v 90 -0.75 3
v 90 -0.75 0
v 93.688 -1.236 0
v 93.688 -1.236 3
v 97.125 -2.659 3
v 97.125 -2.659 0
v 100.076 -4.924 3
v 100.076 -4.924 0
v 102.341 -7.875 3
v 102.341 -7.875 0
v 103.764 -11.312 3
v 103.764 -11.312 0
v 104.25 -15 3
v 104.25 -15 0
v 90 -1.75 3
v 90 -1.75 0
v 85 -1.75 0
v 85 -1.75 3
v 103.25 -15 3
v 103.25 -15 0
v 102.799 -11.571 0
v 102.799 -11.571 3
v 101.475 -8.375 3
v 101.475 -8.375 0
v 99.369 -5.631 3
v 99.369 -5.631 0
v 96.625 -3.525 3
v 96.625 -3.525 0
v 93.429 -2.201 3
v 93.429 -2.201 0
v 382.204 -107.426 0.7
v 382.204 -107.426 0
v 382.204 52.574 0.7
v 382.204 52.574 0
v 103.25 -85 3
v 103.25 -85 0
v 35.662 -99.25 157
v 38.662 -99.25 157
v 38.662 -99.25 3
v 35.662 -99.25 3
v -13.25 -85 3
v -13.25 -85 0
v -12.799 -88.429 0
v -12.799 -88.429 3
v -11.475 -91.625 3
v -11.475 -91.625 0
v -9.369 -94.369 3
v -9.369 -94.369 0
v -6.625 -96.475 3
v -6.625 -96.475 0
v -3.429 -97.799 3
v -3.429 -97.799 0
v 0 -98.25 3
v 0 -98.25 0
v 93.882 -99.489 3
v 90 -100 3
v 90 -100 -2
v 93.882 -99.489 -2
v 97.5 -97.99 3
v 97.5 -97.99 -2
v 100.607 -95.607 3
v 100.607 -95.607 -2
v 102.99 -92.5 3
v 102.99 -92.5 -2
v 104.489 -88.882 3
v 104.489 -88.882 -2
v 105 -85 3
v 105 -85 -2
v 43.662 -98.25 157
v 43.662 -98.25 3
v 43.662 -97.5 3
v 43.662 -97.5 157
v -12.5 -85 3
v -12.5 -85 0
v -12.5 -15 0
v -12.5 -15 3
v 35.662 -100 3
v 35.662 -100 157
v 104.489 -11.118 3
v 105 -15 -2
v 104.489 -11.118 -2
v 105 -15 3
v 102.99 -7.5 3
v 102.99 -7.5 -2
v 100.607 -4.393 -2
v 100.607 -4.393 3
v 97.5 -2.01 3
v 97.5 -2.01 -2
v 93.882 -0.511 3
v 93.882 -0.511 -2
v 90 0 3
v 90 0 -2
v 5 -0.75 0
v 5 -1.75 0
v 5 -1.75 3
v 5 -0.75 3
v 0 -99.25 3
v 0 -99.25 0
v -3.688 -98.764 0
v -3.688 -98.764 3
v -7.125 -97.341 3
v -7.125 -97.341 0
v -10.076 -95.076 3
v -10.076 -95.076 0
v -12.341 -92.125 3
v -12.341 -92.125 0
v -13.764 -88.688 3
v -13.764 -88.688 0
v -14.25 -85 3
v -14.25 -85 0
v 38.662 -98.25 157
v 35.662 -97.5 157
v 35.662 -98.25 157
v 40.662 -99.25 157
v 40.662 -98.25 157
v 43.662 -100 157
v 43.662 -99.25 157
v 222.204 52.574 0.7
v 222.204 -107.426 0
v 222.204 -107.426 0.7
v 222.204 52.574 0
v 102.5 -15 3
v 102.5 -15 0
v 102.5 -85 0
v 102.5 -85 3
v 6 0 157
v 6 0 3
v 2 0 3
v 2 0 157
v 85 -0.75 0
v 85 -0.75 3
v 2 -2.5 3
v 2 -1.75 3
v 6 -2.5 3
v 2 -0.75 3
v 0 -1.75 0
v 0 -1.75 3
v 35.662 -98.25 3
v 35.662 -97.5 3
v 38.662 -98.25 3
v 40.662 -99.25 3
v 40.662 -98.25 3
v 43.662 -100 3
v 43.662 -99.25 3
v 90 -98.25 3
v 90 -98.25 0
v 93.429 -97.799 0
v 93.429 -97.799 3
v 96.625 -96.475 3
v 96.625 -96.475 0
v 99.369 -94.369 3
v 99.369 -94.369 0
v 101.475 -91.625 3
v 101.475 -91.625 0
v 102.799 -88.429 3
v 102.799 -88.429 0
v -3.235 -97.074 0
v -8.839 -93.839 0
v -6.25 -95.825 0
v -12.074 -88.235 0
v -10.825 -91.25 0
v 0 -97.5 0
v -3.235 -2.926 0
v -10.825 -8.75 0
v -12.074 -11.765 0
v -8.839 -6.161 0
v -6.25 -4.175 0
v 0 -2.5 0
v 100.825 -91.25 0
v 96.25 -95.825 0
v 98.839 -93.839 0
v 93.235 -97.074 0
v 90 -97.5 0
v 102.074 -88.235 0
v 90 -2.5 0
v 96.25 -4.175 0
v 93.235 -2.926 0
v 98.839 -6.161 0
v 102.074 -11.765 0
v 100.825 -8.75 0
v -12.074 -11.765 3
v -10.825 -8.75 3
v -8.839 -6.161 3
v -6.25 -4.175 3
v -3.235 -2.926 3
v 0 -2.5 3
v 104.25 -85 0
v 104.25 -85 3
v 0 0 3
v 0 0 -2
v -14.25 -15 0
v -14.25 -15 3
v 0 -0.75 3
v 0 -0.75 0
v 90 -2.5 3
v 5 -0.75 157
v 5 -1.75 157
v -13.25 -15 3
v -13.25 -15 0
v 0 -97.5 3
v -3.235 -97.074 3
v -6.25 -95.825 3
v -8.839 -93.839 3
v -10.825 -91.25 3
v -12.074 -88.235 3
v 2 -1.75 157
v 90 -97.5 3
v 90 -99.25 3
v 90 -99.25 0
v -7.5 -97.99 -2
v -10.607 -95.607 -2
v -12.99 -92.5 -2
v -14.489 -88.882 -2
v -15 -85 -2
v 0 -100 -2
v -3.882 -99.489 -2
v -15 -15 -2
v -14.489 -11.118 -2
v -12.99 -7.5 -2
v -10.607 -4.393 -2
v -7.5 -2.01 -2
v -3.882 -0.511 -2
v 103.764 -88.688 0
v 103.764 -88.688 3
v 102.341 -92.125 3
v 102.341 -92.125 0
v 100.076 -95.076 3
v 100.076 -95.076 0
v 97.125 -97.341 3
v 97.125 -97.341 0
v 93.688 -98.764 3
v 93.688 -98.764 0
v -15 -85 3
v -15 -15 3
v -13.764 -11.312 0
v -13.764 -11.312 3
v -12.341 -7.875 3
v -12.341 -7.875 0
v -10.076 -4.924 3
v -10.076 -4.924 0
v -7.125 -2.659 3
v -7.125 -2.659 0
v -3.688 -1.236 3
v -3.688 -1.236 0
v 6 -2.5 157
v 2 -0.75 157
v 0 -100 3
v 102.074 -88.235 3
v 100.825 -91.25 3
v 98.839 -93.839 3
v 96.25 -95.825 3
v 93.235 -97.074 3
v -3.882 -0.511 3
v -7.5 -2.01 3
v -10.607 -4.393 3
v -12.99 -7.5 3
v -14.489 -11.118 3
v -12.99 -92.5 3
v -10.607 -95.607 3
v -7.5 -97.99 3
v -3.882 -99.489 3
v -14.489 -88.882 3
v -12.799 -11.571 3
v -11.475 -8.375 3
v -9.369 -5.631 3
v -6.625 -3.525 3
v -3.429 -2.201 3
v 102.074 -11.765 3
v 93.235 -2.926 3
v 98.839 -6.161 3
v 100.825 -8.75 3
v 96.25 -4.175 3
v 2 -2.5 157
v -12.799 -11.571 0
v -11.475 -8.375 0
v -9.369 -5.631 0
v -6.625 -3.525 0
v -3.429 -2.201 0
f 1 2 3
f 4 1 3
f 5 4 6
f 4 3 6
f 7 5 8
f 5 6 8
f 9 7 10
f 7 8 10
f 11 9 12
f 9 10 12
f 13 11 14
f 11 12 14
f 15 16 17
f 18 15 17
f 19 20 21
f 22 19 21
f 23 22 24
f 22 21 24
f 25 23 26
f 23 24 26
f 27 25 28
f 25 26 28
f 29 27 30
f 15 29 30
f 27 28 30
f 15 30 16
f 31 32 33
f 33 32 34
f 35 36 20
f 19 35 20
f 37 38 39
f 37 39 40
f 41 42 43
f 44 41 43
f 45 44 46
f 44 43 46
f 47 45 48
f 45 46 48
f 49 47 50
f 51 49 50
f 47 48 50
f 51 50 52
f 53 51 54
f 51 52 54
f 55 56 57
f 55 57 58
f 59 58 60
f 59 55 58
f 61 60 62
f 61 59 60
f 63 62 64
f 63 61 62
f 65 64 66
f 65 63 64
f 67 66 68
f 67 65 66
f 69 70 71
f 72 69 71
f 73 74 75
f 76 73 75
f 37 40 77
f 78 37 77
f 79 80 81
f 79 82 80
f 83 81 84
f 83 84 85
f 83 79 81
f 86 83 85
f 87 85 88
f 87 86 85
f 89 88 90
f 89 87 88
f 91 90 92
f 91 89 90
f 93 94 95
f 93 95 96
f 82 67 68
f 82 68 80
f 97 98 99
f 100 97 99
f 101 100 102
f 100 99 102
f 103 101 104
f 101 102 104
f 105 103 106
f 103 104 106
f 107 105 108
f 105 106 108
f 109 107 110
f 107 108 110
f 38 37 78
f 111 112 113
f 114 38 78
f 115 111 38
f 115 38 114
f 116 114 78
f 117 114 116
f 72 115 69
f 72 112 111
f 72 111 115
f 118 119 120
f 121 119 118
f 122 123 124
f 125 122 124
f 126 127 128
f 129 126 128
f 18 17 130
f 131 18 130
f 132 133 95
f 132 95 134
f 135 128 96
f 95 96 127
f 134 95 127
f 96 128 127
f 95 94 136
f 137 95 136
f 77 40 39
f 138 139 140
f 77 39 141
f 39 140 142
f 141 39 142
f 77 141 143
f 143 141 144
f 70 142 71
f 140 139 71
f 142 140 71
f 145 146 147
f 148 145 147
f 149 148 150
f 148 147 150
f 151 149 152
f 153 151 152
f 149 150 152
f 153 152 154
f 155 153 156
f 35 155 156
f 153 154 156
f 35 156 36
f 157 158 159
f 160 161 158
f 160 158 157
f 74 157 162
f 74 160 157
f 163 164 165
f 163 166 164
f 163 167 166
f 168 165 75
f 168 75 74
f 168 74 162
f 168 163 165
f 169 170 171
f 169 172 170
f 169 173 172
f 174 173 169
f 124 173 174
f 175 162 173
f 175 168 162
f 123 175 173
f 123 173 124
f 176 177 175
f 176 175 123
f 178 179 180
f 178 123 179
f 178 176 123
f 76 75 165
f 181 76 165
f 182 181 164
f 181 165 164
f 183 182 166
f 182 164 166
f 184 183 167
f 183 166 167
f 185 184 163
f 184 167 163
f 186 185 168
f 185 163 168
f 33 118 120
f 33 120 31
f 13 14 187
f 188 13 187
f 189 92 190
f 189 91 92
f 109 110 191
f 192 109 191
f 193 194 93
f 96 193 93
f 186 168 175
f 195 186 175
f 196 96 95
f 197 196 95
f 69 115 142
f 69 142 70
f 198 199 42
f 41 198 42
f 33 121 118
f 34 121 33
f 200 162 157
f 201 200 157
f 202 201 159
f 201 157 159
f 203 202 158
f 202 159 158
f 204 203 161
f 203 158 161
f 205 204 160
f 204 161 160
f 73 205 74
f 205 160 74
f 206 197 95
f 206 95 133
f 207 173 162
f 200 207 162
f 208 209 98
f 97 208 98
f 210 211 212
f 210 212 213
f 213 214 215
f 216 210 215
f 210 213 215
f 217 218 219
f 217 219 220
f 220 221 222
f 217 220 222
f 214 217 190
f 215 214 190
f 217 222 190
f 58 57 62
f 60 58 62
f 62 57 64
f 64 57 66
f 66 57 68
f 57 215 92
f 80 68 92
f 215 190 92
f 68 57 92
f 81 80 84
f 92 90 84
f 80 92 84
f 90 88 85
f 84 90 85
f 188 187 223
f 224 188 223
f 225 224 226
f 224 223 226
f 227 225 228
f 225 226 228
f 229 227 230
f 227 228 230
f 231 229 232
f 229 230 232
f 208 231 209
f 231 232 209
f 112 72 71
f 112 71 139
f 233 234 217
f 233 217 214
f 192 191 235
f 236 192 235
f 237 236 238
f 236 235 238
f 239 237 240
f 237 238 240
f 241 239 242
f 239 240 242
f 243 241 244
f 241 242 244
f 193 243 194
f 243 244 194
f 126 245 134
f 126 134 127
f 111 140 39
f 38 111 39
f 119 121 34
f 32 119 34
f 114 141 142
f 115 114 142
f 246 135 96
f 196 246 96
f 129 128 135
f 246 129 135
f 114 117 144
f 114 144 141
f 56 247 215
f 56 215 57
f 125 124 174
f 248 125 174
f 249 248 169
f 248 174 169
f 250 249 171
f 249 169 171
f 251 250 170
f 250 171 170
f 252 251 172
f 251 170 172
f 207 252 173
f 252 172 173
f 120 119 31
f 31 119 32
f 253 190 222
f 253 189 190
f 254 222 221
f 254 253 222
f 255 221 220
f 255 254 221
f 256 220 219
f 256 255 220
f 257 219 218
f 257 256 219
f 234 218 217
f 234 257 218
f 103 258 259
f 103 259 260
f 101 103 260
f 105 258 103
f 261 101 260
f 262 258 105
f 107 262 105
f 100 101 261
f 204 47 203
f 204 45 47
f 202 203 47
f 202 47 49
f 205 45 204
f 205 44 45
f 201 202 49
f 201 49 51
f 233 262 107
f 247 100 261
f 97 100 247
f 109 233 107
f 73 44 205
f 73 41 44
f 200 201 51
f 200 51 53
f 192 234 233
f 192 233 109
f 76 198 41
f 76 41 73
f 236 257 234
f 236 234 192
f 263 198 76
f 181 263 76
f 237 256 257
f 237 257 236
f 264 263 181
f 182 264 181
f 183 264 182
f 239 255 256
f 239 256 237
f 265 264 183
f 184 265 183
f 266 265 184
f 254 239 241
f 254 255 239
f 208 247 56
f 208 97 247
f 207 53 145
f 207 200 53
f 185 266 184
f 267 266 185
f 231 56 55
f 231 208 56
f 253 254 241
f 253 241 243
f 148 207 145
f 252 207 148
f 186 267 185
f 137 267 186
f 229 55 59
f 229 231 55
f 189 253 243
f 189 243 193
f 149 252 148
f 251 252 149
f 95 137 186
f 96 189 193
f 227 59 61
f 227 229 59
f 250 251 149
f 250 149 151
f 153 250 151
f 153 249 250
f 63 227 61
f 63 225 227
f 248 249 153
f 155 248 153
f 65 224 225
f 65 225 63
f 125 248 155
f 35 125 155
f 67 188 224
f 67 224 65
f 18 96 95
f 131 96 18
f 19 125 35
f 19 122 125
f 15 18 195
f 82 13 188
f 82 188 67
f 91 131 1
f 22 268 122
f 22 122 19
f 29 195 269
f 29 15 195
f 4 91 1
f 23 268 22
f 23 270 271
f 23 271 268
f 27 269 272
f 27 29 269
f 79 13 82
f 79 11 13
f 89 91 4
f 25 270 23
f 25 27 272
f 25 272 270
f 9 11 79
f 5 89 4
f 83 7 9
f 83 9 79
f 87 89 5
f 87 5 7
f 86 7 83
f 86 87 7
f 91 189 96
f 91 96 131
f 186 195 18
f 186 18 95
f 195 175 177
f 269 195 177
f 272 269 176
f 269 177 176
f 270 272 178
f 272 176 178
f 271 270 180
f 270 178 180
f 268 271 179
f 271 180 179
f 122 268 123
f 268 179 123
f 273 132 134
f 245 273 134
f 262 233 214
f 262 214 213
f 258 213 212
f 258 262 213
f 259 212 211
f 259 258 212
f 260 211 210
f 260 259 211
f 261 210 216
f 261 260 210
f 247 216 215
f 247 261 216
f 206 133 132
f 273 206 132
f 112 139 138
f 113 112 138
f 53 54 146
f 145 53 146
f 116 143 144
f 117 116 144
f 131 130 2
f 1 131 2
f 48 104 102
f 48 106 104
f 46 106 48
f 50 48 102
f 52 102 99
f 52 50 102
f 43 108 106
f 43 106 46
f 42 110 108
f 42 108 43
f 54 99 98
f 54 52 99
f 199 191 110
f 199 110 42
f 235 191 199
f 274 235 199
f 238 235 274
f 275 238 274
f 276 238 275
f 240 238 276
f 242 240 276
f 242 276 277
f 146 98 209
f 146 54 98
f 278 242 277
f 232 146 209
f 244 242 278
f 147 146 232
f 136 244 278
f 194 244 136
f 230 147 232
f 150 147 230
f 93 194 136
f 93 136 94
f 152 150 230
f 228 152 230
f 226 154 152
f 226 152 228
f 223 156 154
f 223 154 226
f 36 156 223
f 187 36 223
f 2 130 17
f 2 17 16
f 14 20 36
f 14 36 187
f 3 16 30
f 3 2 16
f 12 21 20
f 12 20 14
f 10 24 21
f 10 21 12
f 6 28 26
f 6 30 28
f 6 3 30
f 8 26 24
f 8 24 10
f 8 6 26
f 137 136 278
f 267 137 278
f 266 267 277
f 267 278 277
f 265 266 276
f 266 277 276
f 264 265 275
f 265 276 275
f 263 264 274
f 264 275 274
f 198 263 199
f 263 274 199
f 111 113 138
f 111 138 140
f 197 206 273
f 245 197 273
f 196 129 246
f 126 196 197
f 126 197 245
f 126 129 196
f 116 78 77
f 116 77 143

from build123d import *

# Parameters (mm, degrees)
F0_W     = 80
F0_H     = 0.75
F0_H_2   = 1
F1_DEPTH = 3
F2_DEPTH = 2
F3_W     = 160
F3_H     = 160
F4_DEPTH = 0.7
F6_DEPTH = 154


with BuildPart() as f1:
    # F0 (on Top) → F1 (new body)
    with BuildSketch(Plane.XY):
        with BuildLine():
            Line((5, 0), (0, 0))
            ThreePointArc((0, 0), (-10.6066017178, -4.3933982822), (-15, -15))
            Line((-15, -15), (-15, -85))
            ThreePointArc((-15, -85), (-10.6066017178, -95.6066017178), (0, -100))
            Line((0, -100), (90, -100))
            ThreePointArc((90, -100), (100.6066017178, -95.6066017178), (105, -85))
            Line((105, -85), (105, -15))
            ThreePointArc((105, -15), (100.6066017178, -4.3933982822), (90, 0))
            Line((90, 0), (85, 0))
            Line((85, 0), (85, -0.75))
            Line((85, -0.75), (90, -0.75))
            ThreePointArc((90, -0.75), (100.0762716319, -4.9237283681), (104.25, -15))
            Line((104.25, -15), (104.25, -85))
            ThreePointArc((104.25, -85), (100.0762716319, -95.0762716319), (90, -99.25))
            Line((90, -99.25), (0, -99.25))
            ThreePointArc((0, -99.25), (-10.0762716319, -95.0762716319), (-14.25, -85))
            Line((-14.25, -85), (-14.25, -15))
            ThreePointArc((-14.25, -15), (-10.0762716319, -4.9237283681), (0, -0.75))
            Line((0, -0.75), (5, -0.75))
            Line((5, -0.75), (5, 0))
        make_face()
        with BuildLine():
            Line((5, -2.5), (5, -1.75))
            Line((5, -1.75), (0, -1.75))
            ThreePointArc((0, -1.75), (-9.3691648507, -5.6308351493), (-13.25, -15))
            Line((-13.25, -15), (-13.25, -85))
            ThreePointArc((-13.25, -85), (-9.3691648507, -94.3691648507), (0, -98.25))
            Line((0, -98.25), (90, -98.25))
            ThreePointArc((90, -98.25), (99.3691648507, -94.3691648507), (103.25, -85))
            Line((103.25, -85), (103.25, -15))
            ThreePointArc((103.25, -15), (99.3691648507, -5.6308351493), (90, -1.75))
            Line((90, -1.75), (85, -1.75))
            Line((85, -1.75), (85, -2.5))
            Line((85, -2.5), (90, -2.5))
            ThreePointArc((90, -2.5), (98.8388347648, -6.1611652352), (102.5, -15))
            Line((102.5, -15), (102.5, -85))
            ThreePointArc((102.5, -85), (98.8388347648, -93.8388347648), (90, -97.5))
            Line((90, -97.5), (0, -97.5))
            ThreePointArc((0, -97.5), (-8.8388347648, -93.8388347648), (-12.5, -85))
            Line((-12.5, -85), (-12.5, -15))
            ThreePointArc((-12.5, -15), (-8.8388347648, -6.1611652352), (0, -2.5))
            Line((0, -2.5), (5, -2.5))
        make_face()
        with Locations((45, -0.375)):
            Rectangle(F0_W, F0_H)
        with Locations((45, -1.25)):
            Rectangle(F0_W, F0_H_2)
        with Locations((45, -2.125)):
            Rectangle(F0_W, F0_H)
    extrude(amount=F1_DEPTH)

    # F0 (on Top) → F2 (join)
    with BuildSketch(Plane.XY):
        with BuildLine():
            Line((5, 0), (0, 0))
            ThreePointArc((0, 0), (-10.6066017178, -4.3933982822), (-15, -15))
            Line((-15, -15), (-15, -85))
            ThreePointArc((-15, -85), (-10.6066017178, -95.6066017178), (0, -100))
            Line((0, -100), (90, -100))
            ThreePointArc((90, -100), (100.6066017178, -95.6066017178), (105, -85))
            Line((105, -85), (105, -15))
            ThreePointArc((105, -15), (100.6066017178, -4.3933982822), (90, 0))
            Line((90, 0), (85, 0))
            Line((85, 0), (85, -0.75))
            Line((85, -0.75), (90, -0.75))
            ThreePointArc((90, -0.75), (100.0762716319, -4.9237283681), (104.25, -15))
            Line((104.25, -15), (104.25, -85))
            ThreePointArc((104.25, -85), (100.0762716319, -95.0762716319), (90, -99.25))
            Line((90, -99.25), (0, -99.25))
            ThreePointArc((0, -99.25), (-10.0762716319, -95.0762716319), (-14.25, -85))
            Line((-14.25, -85), (-14.25, -15))
            ThreePointArc((-14.25, -15), (-10.0762716319, -4.9237283681), (0, -0.75))
            Line((0, -0.75), (5, -0.75))
            Line((5, -0.75), (5, 0))
        make_face()
        with Locations((45, -0.375)):
            Rectangle(F0_W, F0_H)
        with BuildLine():
            Line((85, -2.5), (5, -2.5))
            Line((5, -2.5), (0, -2.5))
            ThreePointArc((0, -2.5), (-8.8388347648, -6.1611652352), (-12.5, -15))
            Line((-12.5, -15), (-12.5, -85))
            ThreePointArc((-12.5, -85), (-8.8388347648, -93.8388347648), (0, -97.5))
            Line((0, -97.5), (90, -97.5))
            ThreePointArc((90, -97.5), (98.8388347648, -93.8388347648), (102.5, -85))
            Line((102.5, -85), (102.5, -15))
            ThreePointArc((102.5, -15), (98.8388347648, -6.1611652352), (90, -2.5))
            Line((90, -2.5), (85, -2.5))
        make_face()
        with BuildLine():
            Line((5, -2.5), (5, -1.75))
            Line((5, -1.75), (0, -1.75))
            ThreePointArc((0, -1.75), (-9.3691648507, -5.6308351493), (-13.25, -15))
            Line((-13.25, -15), (-13.25, -85))
            ThreePointArc((-13.25, -85), (-9.3691648507, -94.3691648507), (0, -98.25))
            Line((0, -98.25), (90, -98.25))
            ThreePointArc((90, -98.25), (99.3691648507, -94.3691648507), (103.25, -85))
            Line((103.25, -85), (103.25, -15))
            ThreePointArc((103.25, -15), (99.3691648507, -5.6308351493), (90, -1.75))
            Line((90, -1.75), (85, -1.75))
            Line((85, -1.75), (85, -2.5))
            Line((85, -2.5), (90, -2.5))
            ThreePointArc((90, -2.5), (98.8388347648, -6.1611652352), (102.5, -15))
            Line((102.5, -15), (102.5, -85))
            ThreePointArc((102.5, -85), (98.8388347648, -93.8388347648), (90, -97.5))
            Line((90, -97.5), (0, -97.5))
            ThreePointArc((0, -97.5), (-8.8388347648, -93.8388347648), (-12.5, -85))
            Line((-12.5, -85), (-12.5, -15))
            ThreePointArc((-12.5, -15), (-8.8388347648, -6.1611652352), (0, -2.5))
            Line((0, -2.5), (5, -2.5))
        make_face()
        with BuildLine():
            Line((5, -1.75), (5, -0.75))
            Line((5, -0.75), (0, -0.75))
            ThreePointArc((0, -0.75), (-10.0762716319, -4.9237283681), (-14.25, -15))
            Line((-14.25, -15), (-14.25, -85))
            ThreePointArc((-14.25, -85), (-10.0762716319, -95.0762716319), (0, -99.25))
            Line((0, -99.25), (90, -99.25))
            ThreePointArc((90, -99.25), (100.0762716319, -95.0762716319), (104.25, -85))
            Line((104.25, -85), (104.25, -15))
            ThreePointArc((104.25, -15), (100.0762716319, -4.9237283681), (90, -0.75))
            Line((90, -0.75), (85, -0.75))
            Line((85, -0.75), (85, -1.75))
            Line((85, -1.75), (90, -1.75))
            ThreePointArc((90, -1.75), (99.3691648507, -5.6308351493), (103.25, -15))
            Line((103.25, -15), (103.25, -85))
            ThreePointArc((103.25, -85), (99.3691648507, -94.3691648507), (90, -98.25))
            Line((90, -98.25), (0, -98.25))
            ThreePointArc((0, -98.25), (-9.3691648507, -94.3691648507), (-13.25, -85))
            Line((-13.25, -85), (-13.25, -15))
            ThreePointArc((-13.25, -15), (-9.3691648507, -5.6308351493), (0, -1.75))
            Line((0, -1.75), (5, -1.75))
        make_face()
        with Locations((45, -1.25)):
            Rectangle(F0_W, F0_H_2)
        with Locations((45, -2.125)):
            Rectangle(F0_W, F0_H)
    extrude(amount=-F2_DEPTH)


with BuildPart() as f4:
    # F3 (on Top) → F4 (new body)
    with BuildSketch(Plane.XY):
        with Locations((302.2037577629, -27.4255256355)):
            Rectangle(F3_W, F3_H)
    extrude(amount=F4_DEPTH)


with BuildPart() as f6:
    # F5 (on face) → F6 (new body)
    with BuildSketch(Plane.XY.offset(3)):
        Polygon((6, 0), (2, 0), (2, -0.75), (5, -0.75), (5, -1.75), (2, -1.75), (2, -2.5), (6, -2.5), align=None)
    extrude(amount=F6_DEPTH)


with BuildPart() as f6b:
    # F5 (on face) → F6, piece 2 (new body)
    with BuildSketch(Plane.XY.offset(3)):
        Polygon((43.6620785445, -97.5), (35.6620785445, -97.5), (35.6620785445, -98.25), (38.6620785445, -98.25), (38.6620785445, -99.25), (35.6620785445, -99.25), (35.6620785445, -100), (43.6620785445, -100), (43.6620785445, -99.25), (40.6620785445, -99.25), (40.6620785445, -98.25), (43.6620785445, -98.25), align=None)
    extrude(amount=F6_DEPTH)


solid = Compound([f1.part, f4.part, f6.part, f6b.part])
